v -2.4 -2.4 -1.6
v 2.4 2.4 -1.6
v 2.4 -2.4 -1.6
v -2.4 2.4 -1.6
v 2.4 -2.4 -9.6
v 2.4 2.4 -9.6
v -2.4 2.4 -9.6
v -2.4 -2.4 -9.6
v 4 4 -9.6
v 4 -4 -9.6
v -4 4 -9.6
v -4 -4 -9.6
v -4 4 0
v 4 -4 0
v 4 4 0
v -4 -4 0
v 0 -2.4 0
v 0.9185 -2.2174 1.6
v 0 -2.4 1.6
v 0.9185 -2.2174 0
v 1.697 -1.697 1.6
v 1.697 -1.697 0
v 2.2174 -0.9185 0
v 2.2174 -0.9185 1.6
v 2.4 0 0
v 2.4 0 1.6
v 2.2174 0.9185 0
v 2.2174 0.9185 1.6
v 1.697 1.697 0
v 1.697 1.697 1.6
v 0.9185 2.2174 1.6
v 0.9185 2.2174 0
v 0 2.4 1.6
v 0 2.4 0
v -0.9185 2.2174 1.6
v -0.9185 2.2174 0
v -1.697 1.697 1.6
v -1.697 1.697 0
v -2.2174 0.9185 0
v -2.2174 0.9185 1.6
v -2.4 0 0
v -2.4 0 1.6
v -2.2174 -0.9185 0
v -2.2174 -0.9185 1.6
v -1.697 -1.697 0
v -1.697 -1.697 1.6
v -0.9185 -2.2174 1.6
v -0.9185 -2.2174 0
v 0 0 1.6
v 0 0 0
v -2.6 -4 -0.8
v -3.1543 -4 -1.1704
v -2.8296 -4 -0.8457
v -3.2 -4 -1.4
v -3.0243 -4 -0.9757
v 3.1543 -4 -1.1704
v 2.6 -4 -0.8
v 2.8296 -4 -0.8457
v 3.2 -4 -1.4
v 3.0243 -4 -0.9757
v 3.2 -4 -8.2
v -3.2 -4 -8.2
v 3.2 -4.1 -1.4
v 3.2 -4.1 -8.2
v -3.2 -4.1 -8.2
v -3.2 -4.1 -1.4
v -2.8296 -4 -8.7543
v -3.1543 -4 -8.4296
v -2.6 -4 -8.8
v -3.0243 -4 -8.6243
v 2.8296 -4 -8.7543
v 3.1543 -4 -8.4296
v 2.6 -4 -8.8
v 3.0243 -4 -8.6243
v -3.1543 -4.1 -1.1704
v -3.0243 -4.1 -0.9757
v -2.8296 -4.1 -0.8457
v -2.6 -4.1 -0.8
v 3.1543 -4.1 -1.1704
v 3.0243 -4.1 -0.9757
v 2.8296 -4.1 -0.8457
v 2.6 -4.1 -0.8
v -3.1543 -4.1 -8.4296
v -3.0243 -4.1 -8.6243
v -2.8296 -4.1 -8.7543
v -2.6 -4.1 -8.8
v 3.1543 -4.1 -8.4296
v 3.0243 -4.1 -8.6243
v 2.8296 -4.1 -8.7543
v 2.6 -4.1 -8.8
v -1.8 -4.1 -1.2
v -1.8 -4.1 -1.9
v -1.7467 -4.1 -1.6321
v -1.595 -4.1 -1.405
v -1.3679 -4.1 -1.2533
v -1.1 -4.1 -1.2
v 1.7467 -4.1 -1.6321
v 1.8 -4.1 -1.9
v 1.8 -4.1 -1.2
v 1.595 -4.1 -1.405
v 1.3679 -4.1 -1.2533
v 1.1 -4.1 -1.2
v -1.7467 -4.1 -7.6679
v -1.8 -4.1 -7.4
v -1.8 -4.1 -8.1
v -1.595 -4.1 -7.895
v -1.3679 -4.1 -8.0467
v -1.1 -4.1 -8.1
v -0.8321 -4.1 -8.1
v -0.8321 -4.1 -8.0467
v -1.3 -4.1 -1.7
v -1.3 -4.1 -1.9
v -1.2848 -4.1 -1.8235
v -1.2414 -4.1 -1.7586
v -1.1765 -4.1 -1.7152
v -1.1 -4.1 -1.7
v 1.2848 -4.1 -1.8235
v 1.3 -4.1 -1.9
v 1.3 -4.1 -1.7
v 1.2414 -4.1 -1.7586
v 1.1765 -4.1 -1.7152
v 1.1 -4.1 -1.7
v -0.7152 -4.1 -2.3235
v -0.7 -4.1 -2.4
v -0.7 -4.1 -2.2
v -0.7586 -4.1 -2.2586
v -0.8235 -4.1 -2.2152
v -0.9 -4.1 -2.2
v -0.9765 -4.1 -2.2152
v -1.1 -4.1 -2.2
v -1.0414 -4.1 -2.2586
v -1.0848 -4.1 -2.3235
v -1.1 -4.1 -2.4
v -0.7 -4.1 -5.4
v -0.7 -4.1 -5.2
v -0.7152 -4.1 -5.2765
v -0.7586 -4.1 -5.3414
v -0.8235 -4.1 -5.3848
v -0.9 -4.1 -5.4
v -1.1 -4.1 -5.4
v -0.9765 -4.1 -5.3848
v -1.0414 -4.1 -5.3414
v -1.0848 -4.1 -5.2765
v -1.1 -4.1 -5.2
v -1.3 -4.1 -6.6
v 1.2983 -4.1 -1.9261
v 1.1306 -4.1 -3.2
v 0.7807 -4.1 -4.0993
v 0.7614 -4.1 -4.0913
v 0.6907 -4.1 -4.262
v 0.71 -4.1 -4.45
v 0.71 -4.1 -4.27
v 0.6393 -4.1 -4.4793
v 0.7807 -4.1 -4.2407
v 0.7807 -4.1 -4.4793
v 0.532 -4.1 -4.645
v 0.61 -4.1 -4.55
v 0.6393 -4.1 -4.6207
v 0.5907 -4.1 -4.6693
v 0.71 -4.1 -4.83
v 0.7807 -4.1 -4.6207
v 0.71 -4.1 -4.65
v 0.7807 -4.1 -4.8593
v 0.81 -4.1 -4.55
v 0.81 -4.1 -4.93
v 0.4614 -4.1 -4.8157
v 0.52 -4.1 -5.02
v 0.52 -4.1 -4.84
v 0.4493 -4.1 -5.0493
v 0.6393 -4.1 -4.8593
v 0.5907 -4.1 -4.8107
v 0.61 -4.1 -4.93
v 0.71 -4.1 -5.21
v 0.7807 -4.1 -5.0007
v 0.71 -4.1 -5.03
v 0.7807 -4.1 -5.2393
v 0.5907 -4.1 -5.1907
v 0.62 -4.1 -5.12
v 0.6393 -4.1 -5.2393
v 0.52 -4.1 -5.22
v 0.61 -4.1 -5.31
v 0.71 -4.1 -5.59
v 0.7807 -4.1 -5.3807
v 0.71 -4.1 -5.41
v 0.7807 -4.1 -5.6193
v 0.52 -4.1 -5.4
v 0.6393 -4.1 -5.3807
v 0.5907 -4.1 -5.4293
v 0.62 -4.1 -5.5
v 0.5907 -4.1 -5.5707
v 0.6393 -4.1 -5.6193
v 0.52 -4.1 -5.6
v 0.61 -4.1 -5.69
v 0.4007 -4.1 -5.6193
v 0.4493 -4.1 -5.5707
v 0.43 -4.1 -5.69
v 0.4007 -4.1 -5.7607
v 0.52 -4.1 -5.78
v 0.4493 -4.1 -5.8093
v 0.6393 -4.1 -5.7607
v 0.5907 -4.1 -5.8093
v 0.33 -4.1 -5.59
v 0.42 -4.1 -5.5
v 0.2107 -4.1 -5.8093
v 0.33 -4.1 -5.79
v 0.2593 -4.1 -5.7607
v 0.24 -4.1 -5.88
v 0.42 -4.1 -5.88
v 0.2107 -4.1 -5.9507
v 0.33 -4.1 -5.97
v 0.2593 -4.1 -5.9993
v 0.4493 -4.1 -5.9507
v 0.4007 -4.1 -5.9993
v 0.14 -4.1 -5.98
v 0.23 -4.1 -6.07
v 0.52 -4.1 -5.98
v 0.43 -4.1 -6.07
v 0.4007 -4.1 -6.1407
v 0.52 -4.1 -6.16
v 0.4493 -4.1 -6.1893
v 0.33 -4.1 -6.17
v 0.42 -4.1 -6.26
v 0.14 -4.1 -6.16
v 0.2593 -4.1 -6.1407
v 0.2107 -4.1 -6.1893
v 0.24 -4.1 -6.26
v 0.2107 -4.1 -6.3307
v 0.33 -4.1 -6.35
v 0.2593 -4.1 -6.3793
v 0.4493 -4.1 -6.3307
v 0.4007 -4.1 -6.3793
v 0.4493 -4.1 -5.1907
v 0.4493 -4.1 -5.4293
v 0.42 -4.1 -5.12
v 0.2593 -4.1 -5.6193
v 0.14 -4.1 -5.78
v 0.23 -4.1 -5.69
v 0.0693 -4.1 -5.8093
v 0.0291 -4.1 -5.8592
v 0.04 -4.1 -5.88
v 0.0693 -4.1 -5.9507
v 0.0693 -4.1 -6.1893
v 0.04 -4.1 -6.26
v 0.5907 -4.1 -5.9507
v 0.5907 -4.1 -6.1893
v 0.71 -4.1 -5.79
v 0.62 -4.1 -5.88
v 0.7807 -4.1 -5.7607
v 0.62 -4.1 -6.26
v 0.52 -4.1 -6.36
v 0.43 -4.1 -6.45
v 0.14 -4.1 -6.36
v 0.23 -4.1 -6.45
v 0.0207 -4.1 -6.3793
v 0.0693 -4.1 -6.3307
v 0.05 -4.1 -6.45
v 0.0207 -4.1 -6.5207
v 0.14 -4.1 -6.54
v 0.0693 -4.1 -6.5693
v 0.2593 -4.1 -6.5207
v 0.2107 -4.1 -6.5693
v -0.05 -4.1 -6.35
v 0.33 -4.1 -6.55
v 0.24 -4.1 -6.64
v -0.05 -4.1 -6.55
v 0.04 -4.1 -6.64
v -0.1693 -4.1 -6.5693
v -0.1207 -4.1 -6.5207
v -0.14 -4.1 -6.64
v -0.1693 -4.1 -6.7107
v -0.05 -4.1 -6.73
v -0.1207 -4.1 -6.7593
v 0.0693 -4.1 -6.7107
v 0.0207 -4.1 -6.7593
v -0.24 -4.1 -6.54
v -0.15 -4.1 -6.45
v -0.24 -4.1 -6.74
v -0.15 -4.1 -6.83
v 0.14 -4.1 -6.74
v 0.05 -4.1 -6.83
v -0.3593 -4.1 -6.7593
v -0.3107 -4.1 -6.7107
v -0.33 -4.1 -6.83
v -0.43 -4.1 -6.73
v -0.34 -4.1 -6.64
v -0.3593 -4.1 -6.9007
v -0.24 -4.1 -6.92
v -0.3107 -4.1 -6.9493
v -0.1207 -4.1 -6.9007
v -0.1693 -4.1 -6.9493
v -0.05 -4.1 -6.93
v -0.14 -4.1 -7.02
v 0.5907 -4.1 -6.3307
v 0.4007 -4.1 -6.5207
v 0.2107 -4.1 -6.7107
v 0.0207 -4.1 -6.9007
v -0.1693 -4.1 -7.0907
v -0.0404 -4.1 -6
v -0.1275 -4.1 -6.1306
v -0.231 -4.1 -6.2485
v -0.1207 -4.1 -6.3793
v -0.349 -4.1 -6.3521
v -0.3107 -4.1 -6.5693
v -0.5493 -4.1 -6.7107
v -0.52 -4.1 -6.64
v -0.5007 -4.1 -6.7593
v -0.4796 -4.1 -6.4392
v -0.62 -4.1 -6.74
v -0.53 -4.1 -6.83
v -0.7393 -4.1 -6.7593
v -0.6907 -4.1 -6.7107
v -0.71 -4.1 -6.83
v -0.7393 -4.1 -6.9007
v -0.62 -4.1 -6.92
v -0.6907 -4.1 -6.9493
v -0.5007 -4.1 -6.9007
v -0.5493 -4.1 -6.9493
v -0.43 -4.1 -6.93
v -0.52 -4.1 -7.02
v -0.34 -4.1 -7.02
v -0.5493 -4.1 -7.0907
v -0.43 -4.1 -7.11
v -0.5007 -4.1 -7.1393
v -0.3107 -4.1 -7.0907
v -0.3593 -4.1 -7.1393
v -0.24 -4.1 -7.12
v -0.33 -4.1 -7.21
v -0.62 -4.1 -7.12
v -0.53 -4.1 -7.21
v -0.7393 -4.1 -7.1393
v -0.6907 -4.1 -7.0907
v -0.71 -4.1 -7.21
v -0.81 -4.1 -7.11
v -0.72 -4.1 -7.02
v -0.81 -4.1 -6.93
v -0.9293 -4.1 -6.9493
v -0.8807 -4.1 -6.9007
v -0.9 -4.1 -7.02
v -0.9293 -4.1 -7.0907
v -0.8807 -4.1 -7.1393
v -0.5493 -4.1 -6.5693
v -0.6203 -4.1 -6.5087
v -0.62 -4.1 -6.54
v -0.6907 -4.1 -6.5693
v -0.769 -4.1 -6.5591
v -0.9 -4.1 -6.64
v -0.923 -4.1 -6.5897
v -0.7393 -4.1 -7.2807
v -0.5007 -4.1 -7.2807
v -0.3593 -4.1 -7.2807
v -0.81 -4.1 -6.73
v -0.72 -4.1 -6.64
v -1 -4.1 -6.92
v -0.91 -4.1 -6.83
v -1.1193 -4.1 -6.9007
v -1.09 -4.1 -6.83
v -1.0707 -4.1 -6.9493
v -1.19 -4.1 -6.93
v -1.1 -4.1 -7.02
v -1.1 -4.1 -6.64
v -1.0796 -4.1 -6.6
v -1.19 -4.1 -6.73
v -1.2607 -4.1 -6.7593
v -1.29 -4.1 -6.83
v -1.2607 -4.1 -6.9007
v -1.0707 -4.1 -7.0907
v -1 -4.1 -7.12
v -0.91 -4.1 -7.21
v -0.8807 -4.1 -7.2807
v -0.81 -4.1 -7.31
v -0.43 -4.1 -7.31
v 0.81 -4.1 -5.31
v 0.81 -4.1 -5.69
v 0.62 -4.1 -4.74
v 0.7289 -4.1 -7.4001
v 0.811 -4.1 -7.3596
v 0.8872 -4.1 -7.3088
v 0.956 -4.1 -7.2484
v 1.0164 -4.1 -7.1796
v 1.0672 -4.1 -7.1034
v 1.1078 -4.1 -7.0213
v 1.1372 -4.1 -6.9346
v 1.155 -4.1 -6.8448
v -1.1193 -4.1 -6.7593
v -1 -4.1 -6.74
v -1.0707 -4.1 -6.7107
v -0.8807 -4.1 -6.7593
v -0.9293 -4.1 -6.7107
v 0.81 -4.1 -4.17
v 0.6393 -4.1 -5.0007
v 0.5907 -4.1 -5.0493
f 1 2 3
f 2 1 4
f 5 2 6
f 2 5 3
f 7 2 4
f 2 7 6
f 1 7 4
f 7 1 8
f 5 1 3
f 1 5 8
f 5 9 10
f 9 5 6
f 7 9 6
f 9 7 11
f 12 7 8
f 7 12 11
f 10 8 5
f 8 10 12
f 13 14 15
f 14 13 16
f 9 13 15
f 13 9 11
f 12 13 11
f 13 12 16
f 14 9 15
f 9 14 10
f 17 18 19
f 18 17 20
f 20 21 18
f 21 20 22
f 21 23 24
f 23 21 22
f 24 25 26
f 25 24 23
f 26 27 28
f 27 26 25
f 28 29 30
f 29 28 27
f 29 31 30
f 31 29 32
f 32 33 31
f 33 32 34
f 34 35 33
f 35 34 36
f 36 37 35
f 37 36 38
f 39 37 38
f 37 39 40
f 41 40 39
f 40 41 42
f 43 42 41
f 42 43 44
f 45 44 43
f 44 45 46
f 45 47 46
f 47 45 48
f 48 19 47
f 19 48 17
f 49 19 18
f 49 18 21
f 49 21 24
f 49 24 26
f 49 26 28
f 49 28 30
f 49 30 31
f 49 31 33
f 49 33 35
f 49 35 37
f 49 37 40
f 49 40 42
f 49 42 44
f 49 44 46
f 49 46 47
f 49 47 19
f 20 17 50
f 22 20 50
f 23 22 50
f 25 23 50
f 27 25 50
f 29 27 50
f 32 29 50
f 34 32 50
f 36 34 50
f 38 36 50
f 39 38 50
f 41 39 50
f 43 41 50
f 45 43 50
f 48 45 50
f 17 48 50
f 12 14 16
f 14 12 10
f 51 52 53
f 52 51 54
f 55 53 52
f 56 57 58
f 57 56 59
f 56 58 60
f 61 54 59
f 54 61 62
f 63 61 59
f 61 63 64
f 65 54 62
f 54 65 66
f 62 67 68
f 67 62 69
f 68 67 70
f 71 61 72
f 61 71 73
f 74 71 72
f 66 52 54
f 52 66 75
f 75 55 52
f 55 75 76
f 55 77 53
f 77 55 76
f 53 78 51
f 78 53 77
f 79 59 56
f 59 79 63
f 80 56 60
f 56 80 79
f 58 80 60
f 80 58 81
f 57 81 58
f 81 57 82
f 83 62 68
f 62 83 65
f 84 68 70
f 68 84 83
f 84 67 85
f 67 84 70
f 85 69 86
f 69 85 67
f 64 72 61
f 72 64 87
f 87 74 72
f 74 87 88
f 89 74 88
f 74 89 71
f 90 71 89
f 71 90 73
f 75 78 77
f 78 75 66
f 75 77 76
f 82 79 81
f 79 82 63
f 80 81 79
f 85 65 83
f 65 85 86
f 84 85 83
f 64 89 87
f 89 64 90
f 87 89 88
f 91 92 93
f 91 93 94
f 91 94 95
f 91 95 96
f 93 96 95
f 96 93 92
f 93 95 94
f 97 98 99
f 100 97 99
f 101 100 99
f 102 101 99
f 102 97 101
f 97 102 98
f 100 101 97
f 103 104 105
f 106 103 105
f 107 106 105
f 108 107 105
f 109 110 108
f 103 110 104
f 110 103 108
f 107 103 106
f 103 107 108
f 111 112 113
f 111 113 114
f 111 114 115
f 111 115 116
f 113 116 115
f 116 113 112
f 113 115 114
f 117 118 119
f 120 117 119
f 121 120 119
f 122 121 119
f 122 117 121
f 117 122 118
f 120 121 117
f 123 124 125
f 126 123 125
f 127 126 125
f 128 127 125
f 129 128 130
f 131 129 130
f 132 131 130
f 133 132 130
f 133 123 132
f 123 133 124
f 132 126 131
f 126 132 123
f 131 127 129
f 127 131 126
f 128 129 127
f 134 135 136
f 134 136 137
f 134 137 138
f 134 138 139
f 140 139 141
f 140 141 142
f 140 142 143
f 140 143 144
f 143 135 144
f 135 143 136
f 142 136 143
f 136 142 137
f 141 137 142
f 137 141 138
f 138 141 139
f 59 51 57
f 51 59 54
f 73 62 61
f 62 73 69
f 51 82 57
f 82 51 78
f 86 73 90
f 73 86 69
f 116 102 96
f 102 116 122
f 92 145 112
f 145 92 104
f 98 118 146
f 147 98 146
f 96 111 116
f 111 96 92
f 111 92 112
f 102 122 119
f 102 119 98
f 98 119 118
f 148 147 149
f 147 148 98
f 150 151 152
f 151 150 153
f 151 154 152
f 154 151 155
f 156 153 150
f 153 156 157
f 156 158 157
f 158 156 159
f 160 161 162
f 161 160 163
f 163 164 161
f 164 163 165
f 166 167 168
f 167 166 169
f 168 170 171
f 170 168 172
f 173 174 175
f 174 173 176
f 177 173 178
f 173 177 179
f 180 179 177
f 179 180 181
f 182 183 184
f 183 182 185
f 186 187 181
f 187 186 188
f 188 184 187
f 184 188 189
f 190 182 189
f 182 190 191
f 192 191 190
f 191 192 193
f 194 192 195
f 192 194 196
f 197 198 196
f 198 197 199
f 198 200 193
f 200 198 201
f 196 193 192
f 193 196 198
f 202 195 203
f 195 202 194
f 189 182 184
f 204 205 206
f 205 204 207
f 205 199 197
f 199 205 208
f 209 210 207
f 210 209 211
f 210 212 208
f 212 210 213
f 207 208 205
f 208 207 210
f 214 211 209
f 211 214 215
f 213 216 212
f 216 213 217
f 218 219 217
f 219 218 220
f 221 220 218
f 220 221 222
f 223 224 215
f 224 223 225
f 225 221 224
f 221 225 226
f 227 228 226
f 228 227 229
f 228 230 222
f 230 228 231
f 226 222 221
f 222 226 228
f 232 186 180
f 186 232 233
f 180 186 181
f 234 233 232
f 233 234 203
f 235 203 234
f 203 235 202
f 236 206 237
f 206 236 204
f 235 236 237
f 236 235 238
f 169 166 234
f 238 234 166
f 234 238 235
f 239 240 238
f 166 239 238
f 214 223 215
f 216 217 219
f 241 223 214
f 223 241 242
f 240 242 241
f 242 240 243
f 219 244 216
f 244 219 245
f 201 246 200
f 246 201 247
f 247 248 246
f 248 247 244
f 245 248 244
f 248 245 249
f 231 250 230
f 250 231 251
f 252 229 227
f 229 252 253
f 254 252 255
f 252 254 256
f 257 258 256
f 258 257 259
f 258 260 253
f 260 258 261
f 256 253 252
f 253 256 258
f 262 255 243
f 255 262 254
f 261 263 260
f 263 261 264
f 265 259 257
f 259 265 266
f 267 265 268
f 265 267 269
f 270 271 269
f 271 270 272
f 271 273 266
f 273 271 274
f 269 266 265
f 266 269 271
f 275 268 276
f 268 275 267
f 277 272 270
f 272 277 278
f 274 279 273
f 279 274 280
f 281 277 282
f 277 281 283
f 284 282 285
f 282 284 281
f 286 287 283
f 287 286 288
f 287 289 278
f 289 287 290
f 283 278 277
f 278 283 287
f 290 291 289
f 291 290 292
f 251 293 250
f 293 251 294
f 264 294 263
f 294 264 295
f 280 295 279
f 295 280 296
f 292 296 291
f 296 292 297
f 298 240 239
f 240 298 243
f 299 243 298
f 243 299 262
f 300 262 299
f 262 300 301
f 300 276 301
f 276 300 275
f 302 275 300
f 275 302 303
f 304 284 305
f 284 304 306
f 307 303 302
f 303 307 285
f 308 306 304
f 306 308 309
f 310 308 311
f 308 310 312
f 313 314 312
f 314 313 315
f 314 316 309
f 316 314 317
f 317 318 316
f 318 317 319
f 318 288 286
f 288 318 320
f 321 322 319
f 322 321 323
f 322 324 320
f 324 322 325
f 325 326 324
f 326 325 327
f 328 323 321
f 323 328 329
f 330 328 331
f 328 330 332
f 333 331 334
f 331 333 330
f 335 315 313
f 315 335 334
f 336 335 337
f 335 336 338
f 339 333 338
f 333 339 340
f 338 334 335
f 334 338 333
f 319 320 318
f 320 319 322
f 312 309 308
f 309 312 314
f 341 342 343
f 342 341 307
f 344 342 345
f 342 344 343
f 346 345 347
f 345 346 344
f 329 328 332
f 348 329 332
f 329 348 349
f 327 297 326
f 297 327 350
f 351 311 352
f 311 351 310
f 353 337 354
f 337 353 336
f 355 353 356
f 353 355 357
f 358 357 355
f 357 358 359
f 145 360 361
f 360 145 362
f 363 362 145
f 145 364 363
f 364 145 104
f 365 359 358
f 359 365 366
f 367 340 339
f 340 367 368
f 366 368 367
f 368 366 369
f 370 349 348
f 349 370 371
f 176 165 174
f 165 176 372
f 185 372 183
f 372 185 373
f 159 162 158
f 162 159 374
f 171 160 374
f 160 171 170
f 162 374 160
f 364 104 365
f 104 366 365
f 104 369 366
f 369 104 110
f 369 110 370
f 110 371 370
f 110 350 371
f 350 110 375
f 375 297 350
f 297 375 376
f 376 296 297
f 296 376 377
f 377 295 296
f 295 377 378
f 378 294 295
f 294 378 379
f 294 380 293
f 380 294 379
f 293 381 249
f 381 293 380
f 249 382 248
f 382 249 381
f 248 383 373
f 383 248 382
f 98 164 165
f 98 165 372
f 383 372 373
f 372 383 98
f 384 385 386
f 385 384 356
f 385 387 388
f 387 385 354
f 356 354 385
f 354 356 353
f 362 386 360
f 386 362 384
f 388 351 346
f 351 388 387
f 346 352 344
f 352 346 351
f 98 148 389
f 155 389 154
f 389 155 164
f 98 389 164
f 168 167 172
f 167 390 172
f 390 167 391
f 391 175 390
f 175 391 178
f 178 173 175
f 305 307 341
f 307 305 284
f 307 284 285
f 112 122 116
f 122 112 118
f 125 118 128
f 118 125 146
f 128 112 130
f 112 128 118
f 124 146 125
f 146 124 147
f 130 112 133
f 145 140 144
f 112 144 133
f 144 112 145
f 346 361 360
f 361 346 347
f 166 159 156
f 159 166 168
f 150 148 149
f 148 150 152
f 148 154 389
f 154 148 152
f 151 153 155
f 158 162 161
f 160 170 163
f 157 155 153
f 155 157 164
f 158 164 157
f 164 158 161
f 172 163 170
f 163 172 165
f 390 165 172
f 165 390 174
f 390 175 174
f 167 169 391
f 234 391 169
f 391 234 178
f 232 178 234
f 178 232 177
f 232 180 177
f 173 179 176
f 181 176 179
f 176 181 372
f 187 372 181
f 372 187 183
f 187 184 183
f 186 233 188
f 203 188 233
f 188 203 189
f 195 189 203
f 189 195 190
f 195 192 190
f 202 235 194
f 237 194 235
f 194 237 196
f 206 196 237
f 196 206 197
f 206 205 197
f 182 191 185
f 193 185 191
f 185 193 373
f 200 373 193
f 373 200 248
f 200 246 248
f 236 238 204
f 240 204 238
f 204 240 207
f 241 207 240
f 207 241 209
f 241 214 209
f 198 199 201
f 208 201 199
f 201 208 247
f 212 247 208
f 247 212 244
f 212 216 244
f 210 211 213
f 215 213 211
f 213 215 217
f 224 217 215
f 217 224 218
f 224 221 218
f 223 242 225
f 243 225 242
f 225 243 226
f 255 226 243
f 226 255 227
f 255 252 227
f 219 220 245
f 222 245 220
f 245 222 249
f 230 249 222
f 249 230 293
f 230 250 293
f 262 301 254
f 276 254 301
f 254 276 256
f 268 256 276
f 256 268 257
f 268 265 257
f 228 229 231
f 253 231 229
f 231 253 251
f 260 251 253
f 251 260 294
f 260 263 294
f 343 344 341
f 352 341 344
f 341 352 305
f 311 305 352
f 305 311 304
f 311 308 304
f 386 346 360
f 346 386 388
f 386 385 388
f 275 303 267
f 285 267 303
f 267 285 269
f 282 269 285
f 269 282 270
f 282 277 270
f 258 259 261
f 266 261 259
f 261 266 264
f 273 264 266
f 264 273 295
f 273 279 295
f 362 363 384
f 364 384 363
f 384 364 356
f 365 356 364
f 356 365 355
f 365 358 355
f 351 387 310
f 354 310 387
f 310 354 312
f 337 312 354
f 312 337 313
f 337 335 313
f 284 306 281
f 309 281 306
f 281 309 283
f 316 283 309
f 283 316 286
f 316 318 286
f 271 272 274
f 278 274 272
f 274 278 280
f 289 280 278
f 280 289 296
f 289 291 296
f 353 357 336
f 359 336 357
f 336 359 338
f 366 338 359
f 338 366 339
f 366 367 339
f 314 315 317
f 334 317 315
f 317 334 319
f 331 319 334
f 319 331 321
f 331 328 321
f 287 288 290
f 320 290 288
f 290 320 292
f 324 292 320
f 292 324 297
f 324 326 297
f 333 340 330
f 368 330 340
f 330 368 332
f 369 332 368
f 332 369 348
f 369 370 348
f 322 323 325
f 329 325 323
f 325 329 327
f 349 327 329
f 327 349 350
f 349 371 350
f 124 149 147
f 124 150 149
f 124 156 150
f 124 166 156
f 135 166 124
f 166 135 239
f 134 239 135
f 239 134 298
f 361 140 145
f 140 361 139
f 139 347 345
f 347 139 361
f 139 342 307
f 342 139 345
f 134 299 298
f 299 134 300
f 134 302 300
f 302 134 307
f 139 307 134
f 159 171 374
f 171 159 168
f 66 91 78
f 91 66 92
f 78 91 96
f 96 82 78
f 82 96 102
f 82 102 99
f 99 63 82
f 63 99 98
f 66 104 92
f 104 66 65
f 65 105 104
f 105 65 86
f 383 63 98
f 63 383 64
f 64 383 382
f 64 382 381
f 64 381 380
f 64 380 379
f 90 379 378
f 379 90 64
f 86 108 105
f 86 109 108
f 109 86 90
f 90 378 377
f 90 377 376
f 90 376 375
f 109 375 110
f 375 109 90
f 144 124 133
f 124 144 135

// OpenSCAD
use <../lib.scad>
use <3005.scad>
use <6142617ab.scad>
function ldraw_lib__3005d0h() = [
// 0 Brick  1 x  1 with Headlamp on Red Background Right Sticker
// 0 Name: 3005d0h.dat
// 0 Author: Alfred Schmitz [AlfredS]
// 0 !LDRAW_ORG Shortcut UPDATE 2026-09
// 0 !LICENSE Licensed under CC BY 4.0 : see CAreadme.txt
// 
// 0 BFC CERTIFY CCW
  [0,"BFC","CERTIFY"],
  [0,"BFC","CCW"],
// 
// 0 !CATEGORY Sticker Shortcut
// 0 !KEYWORDS Camaro, Chevrolet, Drag, Race, Set 75874, Speed Champions
// 
// 0 !HISTORY 2026-09-30 [OrionP] Official Update 2026-09
// 
// 1 16 0 0 0 1 0 0 0 1 0 0 0 1 3005.dat
  [1,16,0,0,0,1,0,0,0,1,0,0,0,1, ldraw_lib__3005()],
// 1 16 0 12 -10 1 0 0 0 0 -1 0 1 0 6142617ab.dat
  [1,16,0,12,-10,1,0,0,0,0,-1,0,1,0, ldraw_lib__6142617ab()],
];
module ldraw_lib__3005d0h(step=0, col=false, unit=2/5, alt=false, line=0.2, solid=!$preview)
    makepoly(ldraw_lib__3005d0h(), step=step, col=col, unit=unit, alt=alt, line=line, solid=solid);
ldraw_lib__3005d0h(line=0.2);
